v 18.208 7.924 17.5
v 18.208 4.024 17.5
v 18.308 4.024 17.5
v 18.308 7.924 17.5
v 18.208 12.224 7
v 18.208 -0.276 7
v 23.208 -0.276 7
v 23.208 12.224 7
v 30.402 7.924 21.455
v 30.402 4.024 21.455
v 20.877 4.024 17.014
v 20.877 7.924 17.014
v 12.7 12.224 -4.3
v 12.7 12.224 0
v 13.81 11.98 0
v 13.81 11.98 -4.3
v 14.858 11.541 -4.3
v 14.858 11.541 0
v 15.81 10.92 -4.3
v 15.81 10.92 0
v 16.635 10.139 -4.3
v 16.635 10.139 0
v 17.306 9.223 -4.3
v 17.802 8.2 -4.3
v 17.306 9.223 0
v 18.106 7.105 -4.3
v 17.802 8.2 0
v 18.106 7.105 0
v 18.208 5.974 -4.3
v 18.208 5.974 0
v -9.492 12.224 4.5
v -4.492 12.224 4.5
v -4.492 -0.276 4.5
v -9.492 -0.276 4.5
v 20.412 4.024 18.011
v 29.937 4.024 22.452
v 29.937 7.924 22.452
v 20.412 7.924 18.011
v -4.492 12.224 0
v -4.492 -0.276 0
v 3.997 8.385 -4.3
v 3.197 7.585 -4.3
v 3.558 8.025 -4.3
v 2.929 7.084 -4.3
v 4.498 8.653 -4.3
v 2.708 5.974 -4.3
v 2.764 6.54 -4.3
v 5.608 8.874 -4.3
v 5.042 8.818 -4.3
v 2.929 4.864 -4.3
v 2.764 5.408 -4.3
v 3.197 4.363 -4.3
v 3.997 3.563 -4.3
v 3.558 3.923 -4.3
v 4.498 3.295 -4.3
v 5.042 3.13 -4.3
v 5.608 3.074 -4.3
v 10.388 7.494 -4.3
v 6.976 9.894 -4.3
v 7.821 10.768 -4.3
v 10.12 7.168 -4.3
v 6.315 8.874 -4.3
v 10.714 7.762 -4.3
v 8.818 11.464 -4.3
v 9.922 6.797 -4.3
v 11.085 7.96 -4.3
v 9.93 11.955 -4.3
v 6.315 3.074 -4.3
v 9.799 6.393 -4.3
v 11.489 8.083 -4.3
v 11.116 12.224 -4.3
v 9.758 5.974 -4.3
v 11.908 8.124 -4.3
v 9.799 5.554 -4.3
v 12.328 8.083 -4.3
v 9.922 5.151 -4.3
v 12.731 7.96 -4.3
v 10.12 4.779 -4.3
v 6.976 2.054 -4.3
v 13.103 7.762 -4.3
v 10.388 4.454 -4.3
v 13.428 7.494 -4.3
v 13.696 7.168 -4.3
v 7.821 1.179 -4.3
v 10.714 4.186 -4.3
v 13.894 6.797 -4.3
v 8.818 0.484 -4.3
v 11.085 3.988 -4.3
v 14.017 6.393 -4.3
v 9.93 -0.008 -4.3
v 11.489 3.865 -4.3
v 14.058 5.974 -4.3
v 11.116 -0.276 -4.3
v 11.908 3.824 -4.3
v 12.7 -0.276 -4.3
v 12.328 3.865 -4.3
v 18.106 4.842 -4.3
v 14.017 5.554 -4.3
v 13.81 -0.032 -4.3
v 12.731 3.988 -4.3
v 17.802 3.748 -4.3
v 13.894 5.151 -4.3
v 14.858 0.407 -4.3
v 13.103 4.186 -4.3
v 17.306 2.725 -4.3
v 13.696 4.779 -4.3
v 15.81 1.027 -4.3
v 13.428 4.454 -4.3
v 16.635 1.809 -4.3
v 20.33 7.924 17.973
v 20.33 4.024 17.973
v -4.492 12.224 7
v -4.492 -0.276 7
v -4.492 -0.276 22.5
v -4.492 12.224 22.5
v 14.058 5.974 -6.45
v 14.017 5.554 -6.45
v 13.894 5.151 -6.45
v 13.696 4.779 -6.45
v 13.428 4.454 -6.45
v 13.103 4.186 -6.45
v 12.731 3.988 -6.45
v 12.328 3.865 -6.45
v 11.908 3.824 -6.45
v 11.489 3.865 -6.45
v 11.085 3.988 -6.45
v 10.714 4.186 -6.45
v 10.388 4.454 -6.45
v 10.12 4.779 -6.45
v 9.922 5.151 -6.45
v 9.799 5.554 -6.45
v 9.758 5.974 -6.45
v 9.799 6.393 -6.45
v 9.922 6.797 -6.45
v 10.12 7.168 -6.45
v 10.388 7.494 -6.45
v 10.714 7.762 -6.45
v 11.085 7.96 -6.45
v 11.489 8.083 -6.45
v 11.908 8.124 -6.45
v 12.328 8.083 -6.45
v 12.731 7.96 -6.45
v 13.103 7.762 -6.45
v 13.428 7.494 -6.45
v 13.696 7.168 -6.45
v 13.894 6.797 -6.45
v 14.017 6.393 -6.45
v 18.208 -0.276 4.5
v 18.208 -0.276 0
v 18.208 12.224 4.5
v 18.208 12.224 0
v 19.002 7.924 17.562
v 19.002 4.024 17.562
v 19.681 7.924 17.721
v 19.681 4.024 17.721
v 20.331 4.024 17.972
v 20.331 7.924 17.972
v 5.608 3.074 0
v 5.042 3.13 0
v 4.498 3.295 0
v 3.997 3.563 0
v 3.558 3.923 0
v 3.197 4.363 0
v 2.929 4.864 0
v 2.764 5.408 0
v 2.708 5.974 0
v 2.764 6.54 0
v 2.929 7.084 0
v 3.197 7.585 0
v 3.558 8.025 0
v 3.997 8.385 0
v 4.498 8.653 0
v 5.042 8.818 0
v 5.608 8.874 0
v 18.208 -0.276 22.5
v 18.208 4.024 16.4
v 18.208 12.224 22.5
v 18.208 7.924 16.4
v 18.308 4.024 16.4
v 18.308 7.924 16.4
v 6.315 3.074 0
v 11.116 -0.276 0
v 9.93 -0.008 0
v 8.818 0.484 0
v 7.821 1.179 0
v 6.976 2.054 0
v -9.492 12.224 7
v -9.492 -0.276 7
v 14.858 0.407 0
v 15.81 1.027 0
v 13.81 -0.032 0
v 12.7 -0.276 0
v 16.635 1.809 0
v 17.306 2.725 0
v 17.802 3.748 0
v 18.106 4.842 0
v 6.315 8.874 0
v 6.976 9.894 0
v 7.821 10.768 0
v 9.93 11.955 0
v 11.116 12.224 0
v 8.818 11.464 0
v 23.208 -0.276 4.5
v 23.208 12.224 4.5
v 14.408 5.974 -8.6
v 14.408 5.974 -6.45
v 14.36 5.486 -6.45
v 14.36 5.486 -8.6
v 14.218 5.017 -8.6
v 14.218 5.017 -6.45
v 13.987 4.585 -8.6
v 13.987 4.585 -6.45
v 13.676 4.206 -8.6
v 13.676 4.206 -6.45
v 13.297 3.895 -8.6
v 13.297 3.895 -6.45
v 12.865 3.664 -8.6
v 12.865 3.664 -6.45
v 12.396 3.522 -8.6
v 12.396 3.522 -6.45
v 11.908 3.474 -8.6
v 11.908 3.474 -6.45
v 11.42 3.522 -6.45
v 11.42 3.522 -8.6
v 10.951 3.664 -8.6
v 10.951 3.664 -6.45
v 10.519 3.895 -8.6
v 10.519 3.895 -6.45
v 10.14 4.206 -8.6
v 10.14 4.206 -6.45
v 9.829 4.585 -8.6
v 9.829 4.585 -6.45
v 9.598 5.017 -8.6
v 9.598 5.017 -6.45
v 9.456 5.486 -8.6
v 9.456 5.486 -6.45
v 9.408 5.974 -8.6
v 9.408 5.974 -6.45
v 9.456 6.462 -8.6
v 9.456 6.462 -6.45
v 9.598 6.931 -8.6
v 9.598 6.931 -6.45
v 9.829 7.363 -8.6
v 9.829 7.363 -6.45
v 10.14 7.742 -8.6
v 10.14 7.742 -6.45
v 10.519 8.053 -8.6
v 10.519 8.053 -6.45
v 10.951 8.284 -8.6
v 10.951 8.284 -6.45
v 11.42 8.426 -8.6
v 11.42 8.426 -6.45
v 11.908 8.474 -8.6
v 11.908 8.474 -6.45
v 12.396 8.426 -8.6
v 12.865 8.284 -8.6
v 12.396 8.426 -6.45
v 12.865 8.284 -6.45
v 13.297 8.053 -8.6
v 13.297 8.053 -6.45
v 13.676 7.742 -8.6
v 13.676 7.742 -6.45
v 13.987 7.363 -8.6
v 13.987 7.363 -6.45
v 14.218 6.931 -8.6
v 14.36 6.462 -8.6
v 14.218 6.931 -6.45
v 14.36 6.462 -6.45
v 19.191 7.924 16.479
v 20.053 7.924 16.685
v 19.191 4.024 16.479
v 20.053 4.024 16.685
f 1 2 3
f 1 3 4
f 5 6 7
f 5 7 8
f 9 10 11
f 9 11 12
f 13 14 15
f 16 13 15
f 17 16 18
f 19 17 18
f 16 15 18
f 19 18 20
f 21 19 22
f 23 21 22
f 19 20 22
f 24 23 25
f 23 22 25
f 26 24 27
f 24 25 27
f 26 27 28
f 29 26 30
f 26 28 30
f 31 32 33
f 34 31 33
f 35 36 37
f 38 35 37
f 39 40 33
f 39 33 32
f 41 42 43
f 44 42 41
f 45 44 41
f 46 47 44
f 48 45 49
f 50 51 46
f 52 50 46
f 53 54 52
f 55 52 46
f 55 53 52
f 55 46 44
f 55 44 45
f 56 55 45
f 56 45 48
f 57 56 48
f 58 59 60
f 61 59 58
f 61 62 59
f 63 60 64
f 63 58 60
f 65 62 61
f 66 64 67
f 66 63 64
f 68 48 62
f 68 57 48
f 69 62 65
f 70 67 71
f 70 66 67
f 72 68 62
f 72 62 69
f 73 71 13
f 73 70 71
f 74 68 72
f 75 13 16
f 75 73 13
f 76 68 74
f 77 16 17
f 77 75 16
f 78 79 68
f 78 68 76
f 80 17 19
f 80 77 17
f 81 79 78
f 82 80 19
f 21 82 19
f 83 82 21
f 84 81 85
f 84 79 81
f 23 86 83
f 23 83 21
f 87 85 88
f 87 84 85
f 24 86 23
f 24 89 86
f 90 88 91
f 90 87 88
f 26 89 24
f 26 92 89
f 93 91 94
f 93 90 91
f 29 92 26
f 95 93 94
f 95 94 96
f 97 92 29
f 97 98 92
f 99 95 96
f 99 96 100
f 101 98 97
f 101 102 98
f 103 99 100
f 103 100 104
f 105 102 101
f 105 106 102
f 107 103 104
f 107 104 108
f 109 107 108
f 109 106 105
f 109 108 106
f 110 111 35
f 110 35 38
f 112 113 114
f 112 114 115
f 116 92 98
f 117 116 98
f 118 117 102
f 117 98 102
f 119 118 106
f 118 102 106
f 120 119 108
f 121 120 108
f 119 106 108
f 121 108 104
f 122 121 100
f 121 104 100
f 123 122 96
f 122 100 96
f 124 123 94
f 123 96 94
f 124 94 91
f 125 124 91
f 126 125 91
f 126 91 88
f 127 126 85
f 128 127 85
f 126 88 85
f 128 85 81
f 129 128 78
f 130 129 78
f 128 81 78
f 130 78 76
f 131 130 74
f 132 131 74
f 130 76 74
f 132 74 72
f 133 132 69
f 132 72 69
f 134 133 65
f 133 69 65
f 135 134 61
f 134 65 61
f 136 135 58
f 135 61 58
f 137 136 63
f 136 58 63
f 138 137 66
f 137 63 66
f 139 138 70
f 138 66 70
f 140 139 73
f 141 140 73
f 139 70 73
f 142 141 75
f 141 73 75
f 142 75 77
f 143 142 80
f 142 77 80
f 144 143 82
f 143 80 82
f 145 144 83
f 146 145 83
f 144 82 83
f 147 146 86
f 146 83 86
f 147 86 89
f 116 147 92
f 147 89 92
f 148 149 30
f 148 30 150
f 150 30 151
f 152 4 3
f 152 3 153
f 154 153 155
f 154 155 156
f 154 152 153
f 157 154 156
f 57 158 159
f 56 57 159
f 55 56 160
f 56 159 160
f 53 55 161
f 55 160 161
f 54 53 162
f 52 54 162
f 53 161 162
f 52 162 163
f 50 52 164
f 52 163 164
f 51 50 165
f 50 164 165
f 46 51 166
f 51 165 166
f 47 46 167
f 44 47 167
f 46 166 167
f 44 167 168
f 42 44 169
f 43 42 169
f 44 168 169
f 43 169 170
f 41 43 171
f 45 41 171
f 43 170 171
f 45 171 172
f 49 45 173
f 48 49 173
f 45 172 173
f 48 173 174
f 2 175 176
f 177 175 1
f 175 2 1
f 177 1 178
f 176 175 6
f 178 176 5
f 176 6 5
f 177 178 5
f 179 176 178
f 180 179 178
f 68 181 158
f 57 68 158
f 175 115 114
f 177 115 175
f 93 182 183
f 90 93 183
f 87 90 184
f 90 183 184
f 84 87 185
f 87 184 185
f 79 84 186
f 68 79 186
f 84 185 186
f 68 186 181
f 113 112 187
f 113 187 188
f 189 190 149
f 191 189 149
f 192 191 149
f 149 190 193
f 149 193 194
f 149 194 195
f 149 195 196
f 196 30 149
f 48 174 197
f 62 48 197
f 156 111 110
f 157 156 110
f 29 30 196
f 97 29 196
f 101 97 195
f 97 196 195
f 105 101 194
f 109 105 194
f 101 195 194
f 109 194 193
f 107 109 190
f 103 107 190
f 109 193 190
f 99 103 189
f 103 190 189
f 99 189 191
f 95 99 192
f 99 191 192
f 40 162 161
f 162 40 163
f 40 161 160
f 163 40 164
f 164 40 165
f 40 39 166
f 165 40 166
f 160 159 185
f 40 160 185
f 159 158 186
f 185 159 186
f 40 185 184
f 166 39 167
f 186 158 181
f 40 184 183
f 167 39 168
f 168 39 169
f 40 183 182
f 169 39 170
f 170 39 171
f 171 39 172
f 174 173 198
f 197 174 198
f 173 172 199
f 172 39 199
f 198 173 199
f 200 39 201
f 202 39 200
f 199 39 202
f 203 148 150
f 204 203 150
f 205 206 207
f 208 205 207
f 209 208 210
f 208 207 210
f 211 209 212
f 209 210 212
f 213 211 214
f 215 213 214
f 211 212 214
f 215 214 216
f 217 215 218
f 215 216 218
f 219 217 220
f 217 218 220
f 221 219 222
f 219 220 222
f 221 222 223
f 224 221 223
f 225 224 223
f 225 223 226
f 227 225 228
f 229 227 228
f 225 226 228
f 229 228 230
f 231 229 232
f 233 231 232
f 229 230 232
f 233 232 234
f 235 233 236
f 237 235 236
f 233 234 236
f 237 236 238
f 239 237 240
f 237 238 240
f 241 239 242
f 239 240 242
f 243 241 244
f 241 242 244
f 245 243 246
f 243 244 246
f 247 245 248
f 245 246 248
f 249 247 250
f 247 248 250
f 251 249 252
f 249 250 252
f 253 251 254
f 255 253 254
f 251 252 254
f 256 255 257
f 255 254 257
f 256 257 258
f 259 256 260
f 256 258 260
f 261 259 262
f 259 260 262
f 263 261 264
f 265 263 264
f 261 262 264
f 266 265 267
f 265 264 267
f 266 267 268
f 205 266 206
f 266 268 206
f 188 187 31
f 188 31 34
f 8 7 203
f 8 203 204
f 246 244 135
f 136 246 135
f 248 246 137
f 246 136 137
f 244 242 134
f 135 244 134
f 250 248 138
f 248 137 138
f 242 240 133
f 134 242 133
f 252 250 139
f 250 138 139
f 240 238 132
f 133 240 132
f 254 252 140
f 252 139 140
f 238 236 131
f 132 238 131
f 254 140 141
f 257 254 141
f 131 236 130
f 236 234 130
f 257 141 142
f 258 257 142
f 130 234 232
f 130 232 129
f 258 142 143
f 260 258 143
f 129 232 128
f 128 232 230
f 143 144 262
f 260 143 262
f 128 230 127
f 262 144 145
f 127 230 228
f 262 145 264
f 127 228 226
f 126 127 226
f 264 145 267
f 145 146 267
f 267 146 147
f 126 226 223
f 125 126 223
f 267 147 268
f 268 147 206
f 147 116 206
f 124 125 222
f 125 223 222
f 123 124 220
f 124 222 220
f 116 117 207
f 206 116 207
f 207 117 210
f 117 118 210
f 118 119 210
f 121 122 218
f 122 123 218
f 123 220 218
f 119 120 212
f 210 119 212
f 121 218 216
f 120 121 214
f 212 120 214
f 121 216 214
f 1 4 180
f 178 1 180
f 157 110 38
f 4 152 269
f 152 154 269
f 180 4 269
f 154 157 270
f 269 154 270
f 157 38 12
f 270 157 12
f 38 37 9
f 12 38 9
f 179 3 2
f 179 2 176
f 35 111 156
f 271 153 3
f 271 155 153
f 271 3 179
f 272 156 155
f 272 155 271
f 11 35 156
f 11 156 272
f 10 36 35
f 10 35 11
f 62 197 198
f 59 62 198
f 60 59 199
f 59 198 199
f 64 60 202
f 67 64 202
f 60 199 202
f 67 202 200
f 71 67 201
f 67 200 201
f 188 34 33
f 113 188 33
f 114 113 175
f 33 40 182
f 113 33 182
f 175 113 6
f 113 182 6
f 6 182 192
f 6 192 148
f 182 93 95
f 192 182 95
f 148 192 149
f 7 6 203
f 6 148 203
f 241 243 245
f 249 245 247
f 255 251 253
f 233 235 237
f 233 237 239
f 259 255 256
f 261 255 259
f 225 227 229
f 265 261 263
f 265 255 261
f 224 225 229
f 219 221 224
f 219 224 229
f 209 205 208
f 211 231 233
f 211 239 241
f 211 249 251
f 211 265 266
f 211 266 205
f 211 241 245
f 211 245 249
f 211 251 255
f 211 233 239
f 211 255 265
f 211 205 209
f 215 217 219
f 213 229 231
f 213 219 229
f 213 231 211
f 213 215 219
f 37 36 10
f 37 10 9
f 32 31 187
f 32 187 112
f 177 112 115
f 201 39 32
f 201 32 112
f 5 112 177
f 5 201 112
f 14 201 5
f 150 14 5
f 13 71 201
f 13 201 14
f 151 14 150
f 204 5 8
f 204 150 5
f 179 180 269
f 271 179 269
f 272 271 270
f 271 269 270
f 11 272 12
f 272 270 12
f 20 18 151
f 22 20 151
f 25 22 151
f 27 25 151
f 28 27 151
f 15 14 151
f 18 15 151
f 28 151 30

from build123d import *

# Parameters (mm, degrees)
F0_W       = 22.7
F0_H       = 12.5
F1_DEPTH   = 22.5
F2_W       = 12.5
F2_H       = 2.5
F3_DEPTH   = 5
F4_W       = 12.5
F4_H       = 2.5
F5_DEPTH   = 5
F7_DEPTH   = 4.3
F8_R       = 2.15
F9_DEPTH   = 2.15
F10_R      = 2.5
F11_DEPTH  = 2.15
F12_W      = 3.9
F12_H      = 1.1
F13_DEPTH  = 0.1
F13_FACE_W = 3.9
F13_FACE_H = 1.1
F14_ANGLE  = 25
F15_W      = 3.9
F15_H      = 1.1
F16_DEPTH  = 10.6


with BuildPart() as f1:
    # F0 (on Top) → F1 (new body)
    with BuildSketch(Plane.XY):
        with Locations((6.858115, 5.973938)):
            Rectangle(F0_W, F0_H)
    extrude(amount=F1_DEPTH)

    # F2 (on face) → F3 (join)
    with BuildSketch(Plane(origin=(-4.491885, 0, 0), x_dir=(0, -1, 0), z_dir=(-1, 0, 0))):
        with Locations((-5.973938, 5.75)):
            Rectangle(F2_W, F2_H)
    extrude(amount=F3_DEPTH)

    # F4 (on face) → F5 (join)
    with BuildSketch(Plane.YZ.offset(18.208115)):
        with Locations((5.973938, 5.75)):
            Rectangle(F4_W, F4_H)
    extrude(amount=F5_DEPTH)

    # F6 (on face) → F7 (join)
    with BuildSketch(Plane(origin=(0, 0, 0), x_dir=(1, 0, 0), z_dir=(0, 0, -1))):
        with BuildLine():
            Line((5.608115, -8.873938), (6.315263, -8.873938))
            ThreePointArc((6.315263, -8.873938), (8.302885, -11.140399), (11.115966, -12.223938))
            Line((11.115966, -12.223938), (12.700264, -12.223938))
            ThreePointArc((12.700264, -12.223938), (16.634664, -10.139239), (18.208115, -5.973938))
            ThreePointArc((18.208115, -5.973938), (16.634664, -1.808637), (12.700264, 0.276062))
            Line((12.700264, 0.276062), (11.115966, 0.276062))
            ThreePointArc((11.115966, 0.276062), (8.302885, -0.807478), (6.315263, -3.073938))
            Line((6.315263, -3.073938), (5.608115, -3.073938))
            ThreePointArc((5.608115, -3.073938), (2.708115, -5.973938), (5.608115, -8.873938))
        make_face()
    extrude(amount=F7_DEPTH)

    # F8 (on face) → F9 (join)
    with BuildSketch(Plane(origin=(0, 0, -4.3), x_dir=(1, 0, 0), z_dir=(0, 0, -1))):
        with Locations((11.908115, -5.973938)):
            Circle(F8_R)
    extrude(amount=F9_DEPTH)

    # F10 (on face) → F11 (join)
    with BuildSketch(Plane(origin=(0, 0, -6.45), x_dir=(1, 0, 0), z_dir=(0, 0, -1))):
        with Locations((11.908115, -5.973938)):
            Circle(F10_R)
    extrude(amount=F11_DEPTH)

    # F12 (on face) → F13 (join)
    with BuildSketch(Plane.YZ.offset(18.208115)):
        with Locations((5.973938, 16.95)):
            Rectangle(F12_W, F12_H)
    extrude(amount=F13_DEPTH)

    # F13_face (on face) → F14 (revolve)
    with BuildSketch(Plane(origin=(18.308115, 5.973938, 16.95), x_dir=(0, 1, 0), z_dir=(1, 0, 0))):
        Rectangle(F13_FACE_W, F13_FACE_H)
    revolve(axis=Axis((18.208115, 5.973938, 22.5), (0, -1, 0)), revolution_arc=F14_ANGLE)

    # F15 (on face) → F16 (join)
    with BuildSketch(Plane(origin=(23.583096, 0, 10.996978), x_dir=(0, 1, 0), z_dir=(0.906308, 0, 0.422618))):
        with Locations((5.973938, 7.146843)):
            Rectangle(F15_W, F15_H)
    extrude(amount=F16_DEPTH)


solid = f1.part
